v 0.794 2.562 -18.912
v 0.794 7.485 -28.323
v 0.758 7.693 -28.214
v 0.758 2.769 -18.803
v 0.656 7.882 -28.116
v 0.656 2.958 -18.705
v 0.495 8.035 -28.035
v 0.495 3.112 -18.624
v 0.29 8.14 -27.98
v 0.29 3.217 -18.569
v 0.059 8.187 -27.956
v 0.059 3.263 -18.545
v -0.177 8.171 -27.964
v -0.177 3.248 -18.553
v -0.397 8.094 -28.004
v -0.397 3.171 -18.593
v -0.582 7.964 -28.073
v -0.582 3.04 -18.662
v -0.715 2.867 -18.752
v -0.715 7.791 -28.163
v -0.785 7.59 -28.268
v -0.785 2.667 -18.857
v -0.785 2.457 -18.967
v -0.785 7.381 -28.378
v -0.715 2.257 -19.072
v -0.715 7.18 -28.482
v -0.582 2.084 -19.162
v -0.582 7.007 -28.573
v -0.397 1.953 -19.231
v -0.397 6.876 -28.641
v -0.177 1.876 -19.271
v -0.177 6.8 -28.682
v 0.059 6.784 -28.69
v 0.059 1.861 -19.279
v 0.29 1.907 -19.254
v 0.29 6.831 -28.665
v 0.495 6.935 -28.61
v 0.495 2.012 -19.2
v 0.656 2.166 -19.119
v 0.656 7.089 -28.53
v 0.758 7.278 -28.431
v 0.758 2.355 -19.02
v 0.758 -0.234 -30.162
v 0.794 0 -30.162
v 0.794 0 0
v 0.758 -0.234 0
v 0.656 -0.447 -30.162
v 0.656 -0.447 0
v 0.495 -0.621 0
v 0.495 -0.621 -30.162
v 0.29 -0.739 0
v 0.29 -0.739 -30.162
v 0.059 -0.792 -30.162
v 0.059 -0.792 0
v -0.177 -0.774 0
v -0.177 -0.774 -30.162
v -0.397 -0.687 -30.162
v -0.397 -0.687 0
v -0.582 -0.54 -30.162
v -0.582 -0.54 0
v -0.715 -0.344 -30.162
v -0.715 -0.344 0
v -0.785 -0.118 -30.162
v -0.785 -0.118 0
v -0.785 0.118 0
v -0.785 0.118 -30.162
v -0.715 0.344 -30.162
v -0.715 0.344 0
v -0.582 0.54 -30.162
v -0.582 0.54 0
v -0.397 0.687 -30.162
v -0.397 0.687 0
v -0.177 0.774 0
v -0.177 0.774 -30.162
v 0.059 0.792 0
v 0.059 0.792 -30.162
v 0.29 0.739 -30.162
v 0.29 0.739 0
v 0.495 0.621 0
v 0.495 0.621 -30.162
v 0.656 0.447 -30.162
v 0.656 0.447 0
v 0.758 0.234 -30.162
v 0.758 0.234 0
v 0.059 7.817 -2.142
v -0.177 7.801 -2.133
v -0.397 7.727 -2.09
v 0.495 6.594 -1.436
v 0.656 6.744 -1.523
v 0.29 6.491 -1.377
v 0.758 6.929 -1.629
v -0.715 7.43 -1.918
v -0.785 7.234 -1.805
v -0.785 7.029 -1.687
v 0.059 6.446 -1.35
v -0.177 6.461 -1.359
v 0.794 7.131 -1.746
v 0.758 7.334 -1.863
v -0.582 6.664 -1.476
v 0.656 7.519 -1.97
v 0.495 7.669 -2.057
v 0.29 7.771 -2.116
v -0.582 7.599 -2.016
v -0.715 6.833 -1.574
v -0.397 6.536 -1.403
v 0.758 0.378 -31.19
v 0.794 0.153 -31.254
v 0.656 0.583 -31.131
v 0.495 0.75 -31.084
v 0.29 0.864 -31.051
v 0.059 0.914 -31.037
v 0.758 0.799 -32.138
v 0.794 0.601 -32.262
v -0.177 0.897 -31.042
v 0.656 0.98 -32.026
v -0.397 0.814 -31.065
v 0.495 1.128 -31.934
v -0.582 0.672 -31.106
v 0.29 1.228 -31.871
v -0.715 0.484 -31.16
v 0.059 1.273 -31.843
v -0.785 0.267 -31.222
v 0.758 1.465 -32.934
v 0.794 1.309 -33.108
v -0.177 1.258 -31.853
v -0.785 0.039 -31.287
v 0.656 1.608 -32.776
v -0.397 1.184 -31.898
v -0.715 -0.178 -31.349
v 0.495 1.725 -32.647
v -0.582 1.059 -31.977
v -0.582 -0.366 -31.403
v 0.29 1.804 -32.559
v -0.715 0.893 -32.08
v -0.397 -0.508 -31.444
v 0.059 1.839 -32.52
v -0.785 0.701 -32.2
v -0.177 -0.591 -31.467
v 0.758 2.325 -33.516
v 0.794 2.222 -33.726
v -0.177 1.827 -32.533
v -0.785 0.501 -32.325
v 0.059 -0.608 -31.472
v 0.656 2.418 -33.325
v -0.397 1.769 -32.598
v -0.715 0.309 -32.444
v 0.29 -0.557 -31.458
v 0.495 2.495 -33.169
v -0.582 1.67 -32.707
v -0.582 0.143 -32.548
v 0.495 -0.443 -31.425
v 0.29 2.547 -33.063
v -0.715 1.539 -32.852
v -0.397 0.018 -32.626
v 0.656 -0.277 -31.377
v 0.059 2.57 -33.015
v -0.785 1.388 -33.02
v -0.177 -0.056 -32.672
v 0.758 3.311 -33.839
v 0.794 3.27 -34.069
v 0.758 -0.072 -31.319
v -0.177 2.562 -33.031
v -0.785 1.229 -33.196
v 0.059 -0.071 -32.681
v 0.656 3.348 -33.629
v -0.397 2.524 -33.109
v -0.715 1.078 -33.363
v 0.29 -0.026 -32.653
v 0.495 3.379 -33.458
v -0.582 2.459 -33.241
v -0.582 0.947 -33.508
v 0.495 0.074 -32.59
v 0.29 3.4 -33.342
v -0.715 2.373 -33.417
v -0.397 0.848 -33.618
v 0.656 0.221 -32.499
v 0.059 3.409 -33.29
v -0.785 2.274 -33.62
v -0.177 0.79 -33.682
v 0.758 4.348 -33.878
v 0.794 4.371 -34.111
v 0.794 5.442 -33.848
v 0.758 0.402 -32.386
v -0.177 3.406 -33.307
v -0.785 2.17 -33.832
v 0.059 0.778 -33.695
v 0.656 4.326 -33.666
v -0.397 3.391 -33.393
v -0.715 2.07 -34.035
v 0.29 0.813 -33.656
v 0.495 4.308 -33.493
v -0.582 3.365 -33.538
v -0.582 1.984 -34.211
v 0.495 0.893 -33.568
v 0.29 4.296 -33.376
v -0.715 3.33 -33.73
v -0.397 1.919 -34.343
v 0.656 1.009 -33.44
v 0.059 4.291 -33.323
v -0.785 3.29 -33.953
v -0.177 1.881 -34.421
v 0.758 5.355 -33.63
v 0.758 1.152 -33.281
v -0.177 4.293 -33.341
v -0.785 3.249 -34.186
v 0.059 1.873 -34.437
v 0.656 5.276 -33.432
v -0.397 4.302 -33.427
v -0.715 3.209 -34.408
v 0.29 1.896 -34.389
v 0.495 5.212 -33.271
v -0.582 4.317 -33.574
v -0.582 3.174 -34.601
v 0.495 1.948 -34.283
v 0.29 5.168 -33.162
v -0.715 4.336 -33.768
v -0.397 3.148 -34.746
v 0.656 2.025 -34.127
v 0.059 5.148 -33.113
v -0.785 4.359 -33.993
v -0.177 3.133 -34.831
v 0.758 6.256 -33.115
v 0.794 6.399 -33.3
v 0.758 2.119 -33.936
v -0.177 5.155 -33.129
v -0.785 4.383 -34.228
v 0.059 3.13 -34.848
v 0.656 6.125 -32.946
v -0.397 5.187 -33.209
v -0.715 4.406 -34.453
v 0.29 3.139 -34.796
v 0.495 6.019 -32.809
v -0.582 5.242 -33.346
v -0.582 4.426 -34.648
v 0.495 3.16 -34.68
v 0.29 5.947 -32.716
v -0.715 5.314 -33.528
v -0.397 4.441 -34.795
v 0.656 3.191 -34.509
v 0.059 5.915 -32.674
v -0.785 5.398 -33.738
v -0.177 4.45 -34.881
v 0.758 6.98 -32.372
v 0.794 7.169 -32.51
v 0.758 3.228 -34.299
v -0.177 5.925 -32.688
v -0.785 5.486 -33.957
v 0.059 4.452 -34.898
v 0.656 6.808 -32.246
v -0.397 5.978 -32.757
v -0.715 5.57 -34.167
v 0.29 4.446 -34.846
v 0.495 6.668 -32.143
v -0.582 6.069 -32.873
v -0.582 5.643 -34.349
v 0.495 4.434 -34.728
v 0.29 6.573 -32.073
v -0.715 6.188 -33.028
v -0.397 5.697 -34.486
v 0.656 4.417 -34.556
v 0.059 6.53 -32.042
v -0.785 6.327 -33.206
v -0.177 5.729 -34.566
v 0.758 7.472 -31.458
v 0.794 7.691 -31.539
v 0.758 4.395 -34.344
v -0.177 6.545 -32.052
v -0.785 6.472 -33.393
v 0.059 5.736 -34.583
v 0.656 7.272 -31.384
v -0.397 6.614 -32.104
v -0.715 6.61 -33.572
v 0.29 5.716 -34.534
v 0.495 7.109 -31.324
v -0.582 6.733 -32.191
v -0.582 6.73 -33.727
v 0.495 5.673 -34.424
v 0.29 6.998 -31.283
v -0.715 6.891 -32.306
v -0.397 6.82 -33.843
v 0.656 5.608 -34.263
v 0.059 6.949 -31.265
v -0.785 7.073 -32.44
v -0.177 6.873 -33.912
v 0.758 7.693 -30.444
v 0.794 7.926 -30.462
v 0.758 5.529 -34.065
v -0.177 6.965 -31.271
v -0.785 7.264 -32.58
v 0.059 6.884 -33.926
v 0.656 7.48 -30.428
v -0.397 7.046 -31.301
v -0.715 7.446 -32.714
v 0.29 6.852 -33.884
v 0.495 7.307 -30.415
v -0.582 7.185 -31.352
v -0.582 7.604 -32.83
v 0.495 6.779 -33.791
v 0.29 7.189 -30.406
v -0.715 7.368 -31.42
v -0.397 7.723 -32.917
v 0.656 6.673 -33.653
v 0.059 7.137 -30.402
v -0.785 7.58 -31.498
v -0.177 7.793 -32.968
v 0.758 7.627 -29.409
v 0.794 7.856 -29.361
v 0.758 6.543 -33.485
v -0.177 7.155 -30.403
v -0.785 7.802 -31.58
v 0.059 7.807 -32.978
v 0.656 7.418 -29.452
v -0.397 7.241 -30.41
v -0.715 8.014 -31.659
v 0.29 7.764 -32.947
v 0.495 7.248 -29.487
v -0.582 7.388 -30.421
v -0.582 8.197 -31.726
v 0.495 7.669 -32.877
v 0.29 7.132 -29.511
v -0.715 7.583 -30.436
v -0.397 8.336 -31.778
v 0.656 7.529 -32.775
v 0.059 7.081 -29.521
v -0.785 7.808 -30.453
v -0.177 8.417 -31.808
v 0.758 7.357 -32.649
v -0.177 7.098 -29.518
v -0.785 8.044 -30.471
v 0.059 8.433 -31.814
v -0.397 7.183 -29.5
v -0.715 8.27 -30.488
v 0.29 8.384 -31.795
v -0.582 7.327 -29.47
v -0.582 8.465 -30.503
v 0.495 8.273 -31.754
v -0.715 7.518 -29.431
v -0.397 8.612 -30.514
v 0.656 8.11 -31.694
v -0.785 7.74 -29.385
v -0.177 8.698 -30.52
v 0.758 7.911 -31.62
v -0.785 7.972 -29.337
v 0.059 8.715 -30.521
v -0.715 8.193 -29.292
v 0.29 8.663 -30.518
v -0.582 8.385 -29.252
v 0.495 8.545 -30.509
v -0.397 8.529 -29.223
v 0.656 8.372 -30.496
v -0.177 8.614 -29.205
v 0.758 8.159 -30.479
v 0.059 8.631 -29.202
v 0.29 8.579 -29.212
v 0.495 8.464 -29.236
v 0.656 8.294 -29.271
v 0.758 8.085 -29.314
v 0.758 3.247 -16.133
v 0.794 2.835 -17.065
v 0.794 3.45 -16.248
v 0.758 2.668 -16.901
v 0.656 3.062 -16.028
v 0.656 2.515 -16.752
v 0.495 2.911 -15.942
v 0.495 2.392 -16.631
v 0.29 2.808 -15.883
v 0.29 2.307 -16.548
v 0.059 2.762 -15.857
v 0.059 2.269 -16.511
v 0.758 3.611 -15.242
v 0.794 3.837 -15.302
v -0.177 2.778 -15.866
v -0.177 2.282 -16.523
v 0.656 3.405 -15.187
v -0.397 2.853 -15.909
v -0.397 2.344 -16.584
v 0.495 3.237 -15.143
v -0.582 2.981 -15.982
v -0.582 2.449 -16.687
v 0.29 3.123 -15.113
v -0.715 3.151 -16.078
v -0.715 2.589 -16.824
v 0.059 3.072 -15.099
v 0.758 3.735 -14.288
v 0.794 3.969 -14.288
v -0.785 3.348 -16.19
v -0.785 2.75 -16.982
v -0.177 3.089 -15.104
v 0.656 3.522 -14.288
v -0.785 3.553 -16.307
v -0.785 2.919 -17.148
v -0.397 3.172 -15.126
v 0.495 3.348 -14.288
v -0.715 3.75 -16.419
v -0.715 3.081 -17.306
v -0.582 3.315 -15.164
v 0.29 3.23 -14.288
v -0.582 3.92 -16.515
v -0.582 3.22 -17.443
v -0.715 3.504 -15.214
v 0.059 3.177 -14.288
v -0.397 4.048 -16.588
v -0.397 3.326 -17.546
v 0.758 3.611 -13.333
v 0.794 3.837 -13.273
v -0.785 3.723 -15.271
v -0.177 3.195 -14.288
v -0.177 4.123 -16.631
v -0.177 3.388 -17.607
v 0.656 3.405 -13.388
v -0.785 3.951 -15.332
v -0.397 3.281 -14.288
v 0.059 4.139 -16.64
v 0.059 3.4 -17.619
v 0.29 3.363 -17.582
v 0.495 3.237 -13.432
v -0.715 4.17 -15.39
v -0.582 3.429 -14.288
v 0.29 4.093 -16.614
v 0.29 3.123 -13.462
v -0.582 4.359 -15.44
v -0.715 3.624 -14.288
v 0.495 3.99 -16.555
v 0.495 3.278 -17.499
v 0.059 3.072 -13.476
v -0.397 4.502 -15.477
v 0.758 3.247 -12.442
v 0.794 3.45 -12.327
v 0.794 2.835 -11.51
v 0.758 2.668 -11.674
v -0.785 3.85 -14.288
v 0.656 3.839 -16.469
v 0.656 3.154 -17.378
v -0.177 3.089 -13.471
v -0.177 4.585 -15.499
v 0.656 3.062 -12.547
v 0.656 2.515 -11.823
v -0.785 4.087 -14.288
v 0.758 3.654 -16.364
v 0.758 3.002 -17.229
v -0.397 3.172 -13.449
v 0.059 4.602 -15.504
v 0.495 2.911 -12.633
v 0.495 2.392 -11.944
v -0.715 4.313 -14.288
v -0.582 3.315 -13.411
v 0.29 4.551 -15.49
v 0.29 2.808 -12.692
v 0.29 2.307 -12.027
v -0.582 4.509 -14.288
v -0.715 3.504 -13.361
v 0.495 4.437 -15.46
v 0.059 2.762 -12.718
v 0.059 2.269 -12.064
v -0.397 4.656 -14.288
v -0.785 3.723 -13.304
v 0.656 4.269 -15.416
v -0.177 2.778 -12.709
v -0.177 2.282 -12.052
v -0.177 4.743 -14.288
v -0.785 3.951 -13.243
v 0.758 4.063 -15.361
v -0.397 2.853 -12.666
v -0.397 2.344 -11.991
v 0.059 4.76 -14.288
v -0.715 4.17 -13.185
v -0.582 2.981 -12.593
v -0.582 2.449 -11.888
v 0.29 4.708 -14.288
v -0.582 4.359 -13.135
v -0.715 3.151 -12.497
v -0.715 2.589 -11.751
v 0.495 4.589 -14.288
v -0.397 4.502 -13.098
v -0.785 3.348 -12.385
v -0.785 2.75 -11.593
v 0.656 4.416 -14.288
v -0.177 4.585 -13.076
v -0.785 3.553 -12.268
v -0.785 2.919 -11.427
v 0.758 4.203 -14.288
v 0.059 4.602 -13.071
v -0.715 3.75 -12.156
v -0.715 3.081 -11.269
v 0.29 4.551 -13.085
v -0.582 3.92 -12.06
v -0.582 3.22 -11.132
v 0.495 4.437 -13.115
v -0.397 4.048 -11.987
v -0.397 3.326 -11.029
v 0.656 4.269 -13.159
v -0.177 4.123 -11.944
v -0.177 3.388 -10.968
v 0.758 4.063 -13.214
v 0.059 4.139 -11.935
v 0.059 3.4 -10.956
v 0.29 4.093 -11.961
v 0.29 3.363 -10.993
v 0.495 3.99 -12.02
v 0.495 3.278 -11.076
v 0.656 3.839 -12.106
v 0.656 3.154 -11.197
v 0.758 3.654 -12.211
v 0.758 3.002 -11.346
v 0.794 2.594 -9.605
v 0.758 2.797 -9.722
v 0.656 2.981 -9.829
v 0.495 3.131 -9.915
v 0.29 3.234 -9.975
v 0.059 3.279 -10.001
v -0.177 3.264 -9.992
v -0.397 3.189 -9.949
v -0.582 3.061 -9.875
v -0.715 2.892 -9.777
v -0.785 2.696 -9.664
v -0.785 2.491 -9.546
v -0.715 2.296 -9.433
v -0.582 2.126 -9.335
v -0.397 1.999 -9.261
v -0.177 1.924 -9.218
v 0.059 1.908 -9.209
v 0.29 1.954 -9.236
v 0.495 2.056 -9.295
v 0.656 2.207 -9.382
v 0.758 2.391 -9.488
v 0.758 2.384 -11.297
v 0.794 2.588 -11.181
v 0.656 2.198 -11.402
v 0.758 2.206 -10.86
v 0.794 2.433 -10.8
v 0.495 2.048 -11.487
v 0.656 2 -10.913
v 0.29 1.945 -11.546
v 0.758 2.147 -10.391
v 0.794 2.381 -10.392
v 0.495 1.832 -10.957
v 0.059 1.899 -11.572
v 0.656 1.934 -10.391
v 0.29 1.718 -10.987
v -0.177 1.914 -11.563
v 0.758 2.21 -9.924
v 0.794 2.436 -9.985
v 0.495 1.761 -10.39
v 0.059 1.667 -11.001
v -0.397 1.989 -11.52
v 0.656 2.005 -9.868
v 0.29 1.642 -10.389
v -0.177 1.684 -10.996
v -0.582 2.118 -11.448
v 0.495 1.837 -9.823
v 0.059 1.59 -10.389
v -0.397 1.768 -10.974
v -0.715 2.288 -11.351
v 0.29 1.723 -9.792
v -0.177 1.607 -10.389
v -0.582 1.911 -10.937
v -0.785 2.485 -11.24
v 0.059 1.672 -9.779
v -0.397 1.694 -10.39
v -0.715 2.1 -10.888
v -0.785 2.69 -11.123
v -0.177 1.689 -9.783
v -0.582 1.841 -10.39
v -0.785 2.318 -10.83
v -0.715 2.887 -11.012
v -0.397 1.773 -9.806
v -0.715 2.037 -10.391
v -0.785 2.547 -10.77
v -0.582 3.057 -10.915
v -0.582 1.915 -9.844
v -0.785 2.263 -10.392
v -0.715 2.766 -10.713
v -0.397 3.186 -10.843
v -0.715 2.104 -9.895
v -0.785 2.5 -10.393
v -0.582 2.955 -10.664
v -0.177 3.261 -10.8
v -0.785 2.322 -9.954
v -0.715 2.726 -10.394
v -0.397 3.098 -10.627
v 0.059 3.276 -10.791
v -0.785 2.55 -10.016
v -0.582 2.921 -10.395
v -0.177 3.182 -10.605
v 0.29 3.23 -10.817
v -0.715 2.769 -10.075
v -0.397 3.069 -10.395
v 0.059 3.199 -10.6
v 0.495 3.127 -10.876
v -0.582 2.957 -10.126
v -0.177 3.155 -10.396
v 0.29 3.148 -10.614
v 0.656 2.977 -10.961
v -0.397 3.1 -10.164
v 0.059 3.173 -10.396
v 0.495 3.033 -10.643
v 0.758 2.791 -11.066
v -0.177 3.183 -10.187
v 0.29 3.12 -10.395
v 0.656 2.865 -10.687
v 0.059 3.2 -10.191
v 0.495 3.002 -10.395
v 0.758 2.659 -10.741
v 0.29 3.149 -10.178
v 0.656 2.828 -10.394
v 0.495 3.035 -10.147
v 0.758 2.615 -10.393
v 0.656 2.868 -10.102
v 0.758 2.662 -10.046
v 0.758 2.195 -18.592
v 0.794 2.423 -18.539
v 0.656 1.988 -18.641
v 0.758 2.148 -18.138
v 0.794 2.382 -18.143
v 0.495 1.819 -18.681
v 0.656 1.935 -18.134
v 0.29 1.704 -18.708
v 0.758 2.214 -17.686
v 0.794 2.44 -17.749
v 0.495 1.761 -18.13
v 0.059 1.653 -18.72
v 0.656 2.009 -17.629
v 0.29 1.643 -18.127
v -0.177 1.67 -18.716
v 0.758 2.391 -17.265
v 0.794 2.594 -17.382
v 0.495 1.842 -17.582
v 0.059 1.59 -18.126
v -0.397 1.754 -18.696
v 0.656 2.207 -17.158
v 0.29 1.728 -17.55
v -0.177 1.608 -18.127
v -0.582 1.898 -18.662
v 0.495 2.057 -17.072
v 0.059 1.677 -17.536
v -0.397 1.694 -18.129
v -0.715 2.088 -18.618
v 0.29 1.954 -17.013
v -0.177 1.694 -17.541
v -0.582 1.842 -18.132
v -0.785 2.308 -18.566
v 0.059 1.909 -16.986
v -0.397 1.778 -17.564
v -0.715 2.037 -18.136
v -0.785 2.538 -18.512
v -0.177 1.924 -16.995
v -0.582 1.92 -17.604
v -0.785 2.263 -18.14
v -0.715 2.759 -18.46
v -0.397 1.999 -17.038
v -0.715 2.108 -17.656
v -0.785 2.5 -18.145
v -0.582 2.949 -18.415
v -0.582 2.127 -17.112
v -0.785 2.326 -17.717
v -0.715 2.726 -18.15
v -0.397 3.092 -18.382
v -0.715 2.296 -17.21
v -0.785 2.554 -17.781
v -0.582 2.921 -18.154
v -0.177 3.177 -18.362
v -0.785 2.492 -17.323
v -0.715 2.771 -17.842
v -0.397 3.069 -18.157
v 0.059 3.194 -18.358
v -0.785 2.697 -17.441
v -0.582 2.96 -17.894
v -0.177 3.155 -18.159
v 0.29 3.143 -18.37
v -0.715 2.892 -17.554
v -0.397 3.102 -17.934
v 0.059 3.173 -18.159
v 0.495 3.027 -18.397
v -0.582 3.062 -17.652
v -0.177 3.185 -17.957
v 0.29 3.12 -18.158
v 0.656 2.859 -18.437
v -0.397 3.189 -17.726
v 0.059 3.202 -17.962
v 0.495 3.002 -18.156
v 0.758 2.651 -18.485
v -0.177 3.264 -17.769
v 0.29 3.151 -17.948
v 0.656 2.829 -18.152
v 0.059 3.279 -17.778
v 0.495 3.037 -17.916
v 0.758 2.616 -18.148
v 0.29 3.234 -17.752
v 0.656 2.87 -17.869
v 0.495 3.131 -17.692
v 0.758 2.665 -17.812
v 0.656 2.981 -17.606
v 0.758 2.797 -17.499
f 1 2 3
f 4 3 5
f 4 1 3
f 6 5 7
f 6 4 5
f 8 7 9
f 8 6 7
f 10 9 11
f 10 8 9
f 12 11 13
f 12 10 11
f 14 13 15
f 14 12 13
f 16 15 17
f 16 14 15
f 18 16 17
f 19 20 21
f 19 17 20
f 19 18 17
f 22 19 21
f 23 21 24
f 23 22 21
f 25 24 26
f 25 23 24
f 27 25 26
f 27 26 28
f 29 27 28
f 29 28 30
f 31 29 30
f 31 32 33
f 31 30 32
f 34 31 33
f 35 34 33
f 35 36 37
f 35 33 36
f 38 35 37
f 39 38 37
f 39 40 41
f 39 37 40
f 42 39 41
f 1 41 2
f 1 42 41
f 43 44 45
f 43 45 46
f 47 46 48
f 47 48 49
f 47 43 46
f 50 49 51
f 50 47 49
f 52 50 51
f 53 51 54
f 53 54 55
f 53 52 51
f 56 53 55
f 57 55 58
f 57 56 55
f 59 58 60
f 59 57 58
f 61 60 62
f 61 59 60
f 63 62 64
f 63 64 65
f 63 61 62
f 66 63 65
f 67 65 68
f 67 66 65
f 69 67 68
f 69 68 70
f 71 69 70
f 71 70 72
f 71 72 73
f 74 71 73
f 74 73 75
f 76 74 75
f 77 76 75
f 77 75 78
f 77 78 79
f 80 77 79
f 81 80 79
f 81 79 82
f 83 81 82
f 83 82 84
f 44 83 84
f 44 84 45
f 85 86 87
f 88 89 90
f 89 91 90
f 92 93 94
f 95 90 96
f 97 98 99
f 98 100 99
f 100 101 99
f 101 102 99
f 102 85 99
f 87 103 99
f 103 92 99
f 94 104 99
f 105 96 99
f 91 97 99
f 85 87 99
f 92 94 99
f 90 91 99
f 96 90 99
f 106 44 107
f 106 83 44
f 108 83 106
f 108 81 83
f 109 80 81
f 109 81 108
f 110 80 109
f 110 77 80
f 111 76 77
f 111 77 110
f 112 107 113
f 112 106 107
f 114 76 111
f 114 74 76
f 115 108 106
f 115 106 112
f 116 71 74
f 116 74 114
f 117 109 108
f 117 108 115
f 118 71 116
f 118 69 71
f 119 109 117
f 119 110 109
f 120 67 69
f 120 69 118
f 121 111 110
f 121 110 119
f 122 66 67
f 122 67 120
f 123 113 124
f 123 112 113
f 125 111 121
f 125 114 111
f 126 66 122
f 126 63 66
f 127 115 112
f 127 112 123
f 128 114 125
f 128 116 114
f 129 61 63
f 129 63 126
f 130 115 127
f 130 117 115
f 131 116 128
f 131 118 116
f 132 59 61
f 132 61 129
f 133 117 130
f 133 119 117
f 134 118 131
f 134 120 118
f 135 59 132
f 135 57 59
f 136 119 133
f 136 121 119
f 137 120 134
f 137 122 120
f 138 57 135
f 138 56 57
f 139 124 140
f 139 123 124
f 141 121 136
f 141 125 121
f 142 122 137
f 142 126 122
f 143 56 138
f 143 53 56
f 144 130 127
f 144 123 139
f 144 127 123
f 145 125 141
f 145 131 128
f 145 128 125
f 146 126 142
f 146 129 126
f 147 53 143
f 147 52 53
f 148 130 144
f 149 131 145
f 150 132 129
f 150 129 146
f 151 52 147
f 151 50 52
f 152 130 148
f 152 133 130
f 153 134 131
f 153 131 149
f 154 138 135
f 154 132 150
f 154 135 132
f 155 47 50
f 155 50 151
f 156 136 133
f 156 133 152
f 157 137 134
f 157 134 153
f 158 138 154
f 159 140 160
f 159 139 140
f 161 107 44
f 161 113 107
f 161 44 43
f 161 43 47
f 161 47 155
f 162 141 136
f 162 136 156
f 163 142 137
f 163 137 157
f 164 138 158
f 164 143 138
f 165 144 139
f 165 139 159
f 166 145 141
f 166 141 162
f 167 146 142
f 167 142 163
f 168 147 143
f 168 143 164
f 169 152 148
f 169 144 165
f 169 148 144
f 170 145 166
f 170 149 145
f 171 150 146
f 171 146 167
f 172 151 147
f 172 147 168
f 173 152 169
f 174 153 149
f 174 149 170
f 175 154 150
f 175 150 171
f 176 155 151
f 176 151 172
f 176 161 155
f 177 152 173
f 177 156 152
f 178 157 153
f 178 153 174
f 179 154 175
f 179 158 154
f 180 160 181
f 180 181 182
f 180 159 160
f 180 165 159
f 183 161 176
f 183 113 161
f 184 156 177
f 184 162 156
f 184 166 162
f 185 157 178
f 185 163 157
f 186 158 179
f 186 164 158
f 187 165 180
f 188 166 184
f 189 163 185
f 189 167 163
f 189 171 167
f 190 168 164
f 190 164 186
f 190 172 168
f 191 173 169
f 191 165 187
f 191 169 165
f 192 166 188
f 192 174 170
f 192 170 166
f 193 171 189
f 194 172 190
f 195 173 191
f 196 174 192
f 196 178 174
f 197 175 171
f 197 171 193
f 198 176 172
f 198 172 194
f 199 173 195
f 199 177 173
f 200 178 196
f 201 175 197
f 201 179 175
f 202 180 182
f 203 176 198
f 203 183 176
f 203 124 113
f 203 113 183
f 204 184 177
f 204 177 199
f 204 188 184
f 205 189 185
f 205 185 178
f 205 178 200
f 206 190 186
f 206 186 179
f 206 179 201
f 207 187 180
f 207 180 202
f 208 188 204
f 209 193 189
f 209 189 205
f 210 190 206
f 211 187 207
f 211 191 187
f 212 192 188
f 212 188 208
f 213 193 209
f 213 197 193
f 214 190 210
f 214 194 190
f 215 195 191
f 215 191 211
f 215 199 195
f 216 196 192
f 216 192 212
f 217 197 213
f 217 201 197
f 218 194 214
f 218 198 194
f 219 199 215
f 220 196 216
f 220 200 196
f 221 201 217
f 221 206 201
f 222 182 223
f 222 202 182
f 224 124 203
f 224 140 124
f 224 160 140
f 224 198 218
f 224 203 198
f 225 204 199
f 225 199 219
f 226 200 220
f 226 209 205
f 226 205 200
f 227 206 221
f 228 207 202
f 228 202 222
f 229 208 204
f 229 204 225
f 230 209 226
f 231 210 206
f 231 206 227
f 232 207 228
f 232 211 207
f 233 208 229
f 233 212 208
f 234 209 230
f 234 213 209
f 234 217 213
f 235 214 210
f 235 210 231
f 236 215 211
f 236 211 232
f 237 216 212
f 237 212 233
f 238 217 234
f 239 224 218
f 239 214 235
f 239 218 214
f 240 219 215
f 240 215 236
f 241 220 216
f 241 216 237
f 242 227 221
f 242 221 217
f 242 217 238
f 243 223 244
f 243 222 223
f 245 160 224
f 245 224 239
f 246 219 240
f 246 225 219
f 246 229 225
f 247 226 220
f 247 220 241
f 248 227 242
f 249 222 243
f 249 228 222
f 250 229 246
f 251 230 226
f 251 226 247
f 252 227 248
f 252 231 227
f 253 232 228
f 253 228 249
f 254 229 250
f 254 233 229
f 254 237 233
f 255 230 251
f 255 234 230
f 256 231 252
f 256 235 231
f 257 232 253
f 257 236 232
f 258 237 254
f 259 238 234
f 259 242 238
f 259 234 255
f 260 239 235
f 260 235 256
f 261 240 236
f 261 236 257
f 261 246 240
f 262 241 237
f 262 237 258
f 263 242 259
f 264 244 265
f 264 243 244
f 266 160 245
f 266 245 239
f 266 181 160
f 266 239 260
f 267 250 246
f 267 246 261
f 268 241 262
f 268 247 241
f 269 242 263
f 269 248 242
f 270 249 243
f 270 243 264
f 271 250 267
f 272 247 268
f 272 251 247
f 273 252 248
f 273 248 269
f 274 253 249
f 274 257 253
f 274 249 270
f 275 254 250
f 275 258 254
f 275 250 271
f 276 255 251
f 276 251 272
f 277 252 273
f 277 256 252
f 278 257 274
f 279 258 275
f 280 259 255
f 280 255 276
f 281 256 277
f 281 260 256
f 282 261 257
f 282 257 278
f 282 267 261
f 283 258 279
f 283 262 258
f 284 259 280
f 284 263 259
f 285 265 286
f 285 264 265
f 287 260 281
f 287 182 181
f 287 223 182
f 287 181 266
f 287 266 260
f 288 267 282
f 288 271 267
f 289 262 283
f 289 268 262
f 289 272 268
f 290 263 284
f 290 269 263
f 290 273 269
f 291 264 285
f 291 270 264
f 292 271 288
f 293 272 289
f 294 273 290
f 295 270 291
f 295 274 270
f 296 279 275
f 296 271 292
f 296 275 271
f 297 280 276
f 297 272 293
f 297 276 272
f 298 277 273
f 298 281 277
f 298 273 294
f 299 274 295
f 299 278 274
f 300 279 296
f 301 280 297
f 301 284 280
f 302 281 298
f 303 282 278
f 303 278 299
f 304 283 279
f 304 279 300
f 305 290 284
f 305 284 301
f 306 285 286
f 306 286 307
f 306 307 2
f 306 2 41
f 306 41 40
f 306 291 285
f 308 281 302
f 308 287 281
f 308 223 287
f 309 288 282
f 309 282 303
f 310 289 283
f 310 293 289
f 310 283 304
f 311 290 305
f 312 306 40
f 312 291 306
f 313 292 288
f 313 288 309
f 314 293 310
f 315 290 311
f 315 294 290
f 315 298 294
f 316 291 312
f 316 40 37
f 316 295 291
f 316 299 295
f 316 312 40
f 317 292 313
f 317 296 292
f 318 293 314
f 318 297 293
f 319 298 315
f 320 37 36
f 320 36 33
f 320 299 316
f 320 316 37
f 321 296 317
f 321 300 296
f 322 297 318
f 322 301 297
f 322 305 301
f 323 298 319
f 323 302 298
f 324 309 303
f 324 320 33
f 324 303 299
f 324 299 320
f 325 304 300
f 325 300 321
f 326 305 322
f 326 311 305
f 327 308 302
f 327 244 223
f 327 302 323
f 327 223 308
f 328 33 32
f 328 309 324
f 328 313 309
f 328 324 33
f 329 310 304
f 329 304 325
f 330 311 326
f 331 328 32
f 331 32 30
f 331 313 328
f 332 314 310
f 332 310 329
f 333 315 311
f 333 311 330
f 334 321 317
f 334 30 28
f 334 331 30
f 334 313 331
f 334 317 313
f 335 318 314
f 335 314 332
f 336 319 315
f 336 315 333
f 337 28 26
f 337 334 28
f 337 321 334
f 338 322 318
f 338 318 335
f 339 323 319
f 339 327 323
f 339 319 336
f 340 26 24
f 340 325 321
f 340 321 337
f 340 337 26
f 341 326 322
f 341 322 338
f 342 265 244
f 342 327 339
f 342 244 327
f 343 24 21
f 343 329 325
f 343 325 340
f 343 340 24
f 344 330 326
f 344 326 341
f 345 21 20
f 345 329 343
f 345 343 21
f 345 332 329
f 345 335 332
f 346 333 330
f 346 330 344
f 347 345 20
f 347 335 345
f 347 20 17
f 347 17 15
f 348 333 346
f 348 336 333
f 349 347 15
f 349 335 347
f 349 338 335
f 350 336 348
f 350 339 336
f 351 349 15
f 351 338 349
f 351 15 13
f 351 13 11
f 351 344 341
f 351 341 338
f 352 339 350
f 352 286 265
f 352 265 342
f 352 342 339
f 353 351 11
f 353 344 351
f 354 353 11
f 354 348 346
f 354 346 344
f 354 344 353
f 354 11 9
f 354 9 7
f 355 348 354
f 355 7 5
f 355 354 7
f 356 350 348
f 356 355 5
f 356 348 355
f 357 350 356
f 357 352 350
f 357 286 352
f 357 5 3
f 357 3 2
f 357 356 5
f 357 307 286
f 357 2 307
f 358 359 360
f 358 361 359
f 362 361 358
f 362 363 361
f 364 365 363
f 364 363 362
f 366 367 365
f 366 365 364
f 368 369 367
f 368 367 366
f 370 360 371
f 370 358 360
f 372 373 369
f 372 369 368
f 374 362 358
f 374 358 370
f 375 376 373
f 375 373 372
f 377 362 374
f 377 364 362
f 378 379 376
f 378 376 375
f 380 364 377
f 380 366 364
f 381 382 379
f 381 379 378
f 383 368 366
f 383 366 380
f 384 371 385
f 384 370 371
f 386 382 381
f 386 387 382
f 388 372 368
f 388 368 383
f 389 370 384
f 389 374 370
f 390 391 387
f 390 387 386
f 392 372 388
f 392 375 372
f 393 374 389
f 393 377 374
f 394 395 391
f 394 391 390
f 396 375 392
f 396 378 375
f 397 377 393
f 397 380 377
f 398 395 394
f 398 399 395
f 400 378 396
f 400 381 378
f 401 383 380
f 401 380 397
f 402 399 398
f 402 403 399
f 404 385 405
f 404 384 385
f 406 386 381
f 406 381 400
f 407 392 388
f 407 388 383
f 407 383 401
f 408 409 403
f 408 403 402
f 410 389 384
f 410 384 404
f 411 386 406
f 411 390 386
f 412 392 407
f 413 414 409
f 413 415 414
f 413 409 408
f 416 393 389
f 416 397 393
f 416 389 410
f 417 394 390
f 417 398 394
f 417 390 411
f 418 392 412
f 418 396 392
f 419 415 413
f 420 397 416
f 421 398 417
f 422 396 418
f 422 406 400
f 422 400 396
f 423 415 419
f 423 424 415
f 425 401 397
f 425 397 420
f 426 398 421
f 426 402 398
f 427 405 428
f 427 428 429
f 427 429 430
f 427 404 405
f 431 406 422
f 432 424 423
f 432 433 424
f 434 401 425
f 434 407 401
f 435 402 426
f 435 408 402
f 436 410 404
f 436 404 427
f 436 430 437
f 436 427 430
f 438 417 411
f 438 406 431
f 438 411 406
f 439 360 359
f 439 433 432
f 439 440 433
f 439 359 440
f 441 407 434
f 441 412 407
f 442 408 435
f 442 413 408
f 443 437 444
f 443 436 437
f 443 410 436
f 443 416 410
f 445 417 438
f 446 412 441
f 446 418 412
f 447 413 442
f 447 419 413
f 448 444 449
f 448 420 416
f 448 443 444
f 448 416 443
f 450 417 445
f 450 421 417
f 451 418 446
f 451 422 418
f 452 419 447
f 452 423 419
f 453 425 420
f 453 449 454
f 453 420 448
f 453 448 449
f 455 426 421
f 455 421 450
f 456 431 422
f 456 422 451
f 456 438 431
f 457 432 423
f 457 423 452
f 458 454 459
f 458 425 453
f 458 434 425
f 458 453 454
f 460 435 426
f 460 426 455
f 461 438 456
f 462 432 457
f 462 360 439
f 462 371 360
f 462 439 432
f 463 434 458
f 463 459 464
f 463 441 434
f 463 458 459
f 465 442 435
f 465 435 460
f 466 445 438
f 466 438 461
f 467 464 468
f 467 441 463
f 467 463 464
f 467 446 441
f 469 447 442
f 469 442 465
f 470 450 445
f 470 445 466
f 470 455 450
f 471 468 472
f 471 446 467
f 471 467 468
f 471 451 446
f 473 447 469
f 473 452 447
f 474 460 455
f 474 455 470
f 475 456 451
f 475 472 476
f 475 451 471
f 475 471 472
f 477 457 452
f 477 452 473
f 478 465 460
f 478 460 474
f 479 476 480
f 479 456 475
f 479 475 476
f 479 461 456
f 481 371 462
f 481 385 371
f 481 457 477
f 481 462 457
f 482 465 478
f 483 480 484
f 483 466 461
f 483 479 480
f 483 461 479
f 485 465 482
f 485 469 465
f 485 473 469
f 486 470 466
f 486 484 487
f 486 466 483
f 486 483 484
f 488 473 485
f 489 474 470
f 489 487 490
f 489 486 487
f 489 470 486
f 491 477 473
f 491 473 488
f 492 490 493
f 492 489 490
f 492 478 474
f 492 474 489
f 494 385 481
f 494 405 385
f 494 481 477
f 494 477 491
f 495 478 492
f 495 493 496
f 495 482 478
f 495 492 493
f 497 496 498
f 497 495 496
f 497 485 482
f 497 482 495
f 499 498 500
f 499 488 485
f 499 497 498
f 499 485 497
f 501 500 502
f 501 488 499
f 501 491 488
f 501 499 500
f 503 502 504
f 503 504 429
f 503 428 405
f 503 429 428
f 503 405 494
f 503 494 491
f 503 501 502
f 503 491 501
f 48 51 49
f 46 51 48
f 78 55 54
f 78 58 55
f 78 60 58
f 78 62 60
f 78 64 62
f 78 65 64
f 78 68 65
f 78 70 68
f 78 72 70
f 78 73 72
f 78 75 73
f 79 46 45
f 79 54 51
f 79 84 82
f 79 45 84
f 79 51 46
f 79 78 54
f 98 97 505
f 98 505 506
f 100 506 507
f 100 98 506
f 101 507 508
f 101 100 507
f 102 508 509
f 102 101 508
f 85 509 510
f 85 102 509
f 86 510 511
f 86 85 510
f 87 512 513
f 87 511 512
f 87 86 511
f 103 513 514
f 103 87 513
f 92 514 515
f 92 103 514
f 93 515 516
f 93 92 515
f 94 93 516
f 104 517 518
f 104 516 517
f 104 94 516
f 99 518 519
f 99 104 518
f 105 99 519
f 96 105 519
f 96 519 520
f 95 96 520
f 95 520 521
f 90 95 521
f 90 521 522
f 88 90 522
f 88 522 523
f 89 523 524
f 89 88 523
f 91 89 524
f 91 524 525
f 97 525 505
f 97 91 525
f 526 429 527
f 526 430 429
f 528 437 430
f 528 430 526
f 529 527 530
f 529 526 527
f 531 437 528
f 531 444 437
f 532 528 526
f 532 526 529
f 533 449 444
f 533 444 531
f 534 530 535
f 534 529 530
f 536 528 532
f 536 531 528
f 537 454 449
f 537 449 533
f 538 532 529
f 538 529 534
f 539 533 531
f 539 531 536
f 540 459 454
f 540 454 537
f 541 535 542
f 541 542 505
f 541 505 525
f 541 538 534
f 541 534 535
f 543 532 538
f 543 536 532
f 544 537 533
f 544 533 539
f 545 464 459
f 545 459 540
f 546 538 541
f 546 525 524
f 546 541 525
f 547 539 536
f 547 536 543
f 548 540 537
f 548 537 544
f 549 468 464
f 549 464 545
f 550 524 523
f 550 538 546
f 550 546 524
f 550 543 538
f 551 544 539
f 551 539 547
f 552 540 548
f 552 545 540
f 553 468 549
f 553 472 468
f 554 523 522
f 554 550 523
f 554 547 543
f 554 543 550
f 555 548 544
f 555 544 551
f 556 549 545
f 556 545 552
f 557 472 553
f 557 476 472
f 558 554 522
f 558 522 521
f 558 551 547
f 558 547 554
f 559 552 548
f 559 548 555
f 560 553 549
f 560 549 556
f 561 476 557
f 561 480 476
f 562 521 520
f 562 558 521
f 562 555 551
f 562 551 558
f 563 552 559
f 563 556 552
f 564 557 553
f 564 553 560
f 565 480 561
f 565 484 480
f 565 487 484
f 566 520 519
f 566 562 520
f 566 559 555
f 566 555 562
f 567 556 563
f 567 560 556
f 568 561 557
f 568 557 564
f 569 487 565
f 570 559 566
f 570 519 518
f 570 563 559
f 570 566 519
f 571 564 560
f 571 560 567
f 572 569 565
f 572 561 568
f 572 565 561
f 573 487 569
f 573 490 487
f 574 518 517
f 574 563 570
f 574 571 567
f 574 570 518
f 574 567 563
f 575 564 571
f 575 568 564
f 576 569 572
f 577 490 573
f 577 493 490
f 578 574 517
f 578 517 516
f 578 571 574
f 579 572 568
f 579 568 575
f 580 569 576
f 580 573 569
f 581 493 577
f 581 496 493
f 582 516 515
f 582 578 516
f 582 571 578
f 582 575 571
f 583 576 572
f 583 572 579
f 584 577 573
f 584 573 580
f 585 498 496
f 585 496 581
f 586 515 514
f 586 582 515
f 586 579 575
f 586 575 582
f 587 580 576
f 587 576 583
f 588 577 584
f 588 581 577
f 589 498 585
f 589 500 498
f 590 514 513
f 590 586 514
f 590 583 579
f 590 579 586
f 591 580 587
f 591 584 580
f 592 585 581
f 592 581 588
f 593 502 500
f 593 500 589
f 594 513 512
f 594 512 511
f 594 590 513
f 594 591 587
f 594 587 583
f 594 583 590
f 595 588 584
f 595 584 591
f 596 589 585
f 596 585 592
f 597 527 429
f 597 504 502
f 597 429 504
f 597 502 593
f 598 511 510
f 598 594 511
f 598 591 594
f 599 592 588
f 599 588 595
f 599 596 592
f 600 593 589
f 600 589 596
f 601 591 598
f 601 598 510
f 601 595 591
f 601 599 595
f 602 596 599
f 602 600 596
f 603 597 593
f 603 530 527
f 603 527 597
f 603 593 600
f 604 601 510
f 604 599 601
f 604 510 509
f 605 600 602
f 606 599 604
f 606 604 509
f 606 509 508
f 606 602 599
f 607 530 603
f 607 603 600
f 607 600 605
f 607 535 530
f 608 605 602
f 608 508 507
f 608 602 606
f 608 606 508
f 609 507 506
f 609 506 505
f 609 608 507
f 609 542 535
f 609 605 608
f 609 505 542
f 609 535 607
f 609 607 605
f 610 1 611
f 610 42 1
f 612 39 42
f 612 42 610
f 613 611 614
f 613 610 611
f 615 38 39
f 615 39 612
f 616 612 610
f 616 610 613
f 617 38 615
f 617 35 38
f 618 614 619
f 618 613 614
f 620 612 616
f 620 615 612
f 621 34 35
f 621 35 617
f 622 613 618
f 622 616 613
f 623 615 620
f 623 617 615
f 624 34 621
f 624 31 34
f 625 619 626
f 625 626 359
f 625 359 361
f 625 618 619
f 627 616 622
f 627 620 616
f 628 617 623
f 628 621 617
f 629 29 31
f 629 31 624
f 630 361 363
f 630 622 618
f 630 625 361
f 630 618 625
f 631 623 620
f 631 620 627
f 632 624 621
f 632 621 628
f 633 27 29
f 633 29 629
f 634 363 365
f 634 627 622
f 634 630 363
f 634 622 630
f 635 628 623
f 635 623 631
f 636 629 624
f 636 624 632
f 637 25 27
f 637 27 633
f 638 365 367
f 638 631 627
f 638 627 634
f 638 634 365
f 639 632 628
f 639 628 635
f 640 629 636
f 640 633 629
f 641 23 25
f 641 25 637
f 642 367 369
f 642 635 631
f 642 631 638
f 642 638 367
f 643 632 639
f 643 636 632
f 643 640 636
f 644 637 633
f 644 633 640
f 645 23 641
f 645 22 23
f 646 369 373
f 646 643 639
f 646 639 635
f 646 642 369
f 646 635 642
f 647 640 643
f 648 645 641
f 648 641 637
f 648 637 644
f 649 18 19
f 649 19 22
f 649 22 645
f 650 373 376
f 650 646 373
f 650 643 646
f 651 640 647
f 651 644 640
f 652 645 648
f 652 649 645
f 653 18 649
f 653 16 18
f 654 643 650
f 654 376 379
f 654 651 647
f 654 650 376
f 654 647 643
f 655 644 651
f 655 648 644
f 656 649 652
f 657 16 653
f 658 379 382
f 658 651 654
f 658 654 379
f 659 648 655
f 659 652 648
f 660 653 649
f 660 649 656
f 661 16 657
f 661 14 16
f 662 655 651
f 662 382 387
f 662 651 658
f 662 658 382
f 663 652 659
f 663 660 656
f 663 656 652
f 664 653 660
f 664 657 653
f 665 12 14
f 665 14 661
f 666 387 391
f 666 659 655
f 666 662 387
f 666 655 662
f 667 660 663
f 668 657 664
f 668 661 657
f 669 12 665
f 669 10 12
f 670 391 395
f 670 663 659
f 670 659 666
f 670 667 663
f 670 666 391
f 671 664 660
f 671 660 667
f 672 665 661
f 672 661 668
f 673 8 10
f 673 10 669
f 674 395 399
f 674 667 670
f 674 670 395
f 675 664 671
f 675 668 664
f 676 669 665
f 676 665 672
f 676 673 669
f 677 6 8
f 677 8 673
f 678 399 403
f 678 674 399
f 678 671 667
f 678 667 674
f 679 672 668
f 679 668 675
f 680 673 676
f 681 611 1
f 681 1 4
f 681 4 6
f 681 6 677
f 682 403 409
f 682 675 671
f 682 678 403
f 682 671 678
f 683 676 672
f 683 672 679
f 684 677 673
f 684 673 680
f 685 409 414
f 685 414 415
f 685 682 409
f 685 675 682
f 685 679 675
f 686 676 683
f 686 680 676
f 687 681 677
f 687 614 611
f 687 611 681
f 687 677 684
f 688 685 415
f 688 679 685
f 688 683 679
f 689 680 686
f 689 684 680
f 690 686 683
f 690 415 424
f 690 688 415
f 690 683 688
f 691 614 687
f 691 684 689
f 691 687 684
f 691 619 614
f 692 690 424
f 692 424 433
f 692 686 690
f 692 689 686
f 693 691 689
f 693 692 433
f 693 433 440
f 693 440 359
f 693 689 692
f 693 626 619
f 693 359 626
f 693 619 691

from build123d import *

# Parameters (mm, degrees)
SKETCH1_R = 0.79375


with BuildPart() as part:
    # Sweep1: sweep along a path in Sketch2
    with BuildLine(Plane(origin=(0, 0, 0), x_dir=(0, 0, -1), z_dir=(1, 0, 0))) as sweep1_path:
        Line((0, 0), (30.1625, 0))
        ThreePointArc((30.1625, 0), (34.016556239, 4.915970709), (28.322806453, 7.485354074))
        Line((28.322806453, 7.485354074), (18.911942386, 2.56210837))
        ThreePointArc((18.911942386, 2.56210837), (17.944168821, 2.398278597), (17.065046405, 2.834821429))
        ThreePointArc((17.065046405, 2.834821429), (14.2875, 3.96875), (11.509953595, 2.834821429))
        ThreePointArc((11.509953595, 2.834821429), (10.598111946, 2.393794506), (9.605185033, 2.593934671))
        Line((9.605185033, 2.593934671), (1.74625, 7.131292929))
    # Sketch1 → Sweep1 (sweep)
    with BuildSketch(Plane.XY):
        Circle(SKETCH1_R)
    sweep(path=sweep1_path.line)


solid = part.part
